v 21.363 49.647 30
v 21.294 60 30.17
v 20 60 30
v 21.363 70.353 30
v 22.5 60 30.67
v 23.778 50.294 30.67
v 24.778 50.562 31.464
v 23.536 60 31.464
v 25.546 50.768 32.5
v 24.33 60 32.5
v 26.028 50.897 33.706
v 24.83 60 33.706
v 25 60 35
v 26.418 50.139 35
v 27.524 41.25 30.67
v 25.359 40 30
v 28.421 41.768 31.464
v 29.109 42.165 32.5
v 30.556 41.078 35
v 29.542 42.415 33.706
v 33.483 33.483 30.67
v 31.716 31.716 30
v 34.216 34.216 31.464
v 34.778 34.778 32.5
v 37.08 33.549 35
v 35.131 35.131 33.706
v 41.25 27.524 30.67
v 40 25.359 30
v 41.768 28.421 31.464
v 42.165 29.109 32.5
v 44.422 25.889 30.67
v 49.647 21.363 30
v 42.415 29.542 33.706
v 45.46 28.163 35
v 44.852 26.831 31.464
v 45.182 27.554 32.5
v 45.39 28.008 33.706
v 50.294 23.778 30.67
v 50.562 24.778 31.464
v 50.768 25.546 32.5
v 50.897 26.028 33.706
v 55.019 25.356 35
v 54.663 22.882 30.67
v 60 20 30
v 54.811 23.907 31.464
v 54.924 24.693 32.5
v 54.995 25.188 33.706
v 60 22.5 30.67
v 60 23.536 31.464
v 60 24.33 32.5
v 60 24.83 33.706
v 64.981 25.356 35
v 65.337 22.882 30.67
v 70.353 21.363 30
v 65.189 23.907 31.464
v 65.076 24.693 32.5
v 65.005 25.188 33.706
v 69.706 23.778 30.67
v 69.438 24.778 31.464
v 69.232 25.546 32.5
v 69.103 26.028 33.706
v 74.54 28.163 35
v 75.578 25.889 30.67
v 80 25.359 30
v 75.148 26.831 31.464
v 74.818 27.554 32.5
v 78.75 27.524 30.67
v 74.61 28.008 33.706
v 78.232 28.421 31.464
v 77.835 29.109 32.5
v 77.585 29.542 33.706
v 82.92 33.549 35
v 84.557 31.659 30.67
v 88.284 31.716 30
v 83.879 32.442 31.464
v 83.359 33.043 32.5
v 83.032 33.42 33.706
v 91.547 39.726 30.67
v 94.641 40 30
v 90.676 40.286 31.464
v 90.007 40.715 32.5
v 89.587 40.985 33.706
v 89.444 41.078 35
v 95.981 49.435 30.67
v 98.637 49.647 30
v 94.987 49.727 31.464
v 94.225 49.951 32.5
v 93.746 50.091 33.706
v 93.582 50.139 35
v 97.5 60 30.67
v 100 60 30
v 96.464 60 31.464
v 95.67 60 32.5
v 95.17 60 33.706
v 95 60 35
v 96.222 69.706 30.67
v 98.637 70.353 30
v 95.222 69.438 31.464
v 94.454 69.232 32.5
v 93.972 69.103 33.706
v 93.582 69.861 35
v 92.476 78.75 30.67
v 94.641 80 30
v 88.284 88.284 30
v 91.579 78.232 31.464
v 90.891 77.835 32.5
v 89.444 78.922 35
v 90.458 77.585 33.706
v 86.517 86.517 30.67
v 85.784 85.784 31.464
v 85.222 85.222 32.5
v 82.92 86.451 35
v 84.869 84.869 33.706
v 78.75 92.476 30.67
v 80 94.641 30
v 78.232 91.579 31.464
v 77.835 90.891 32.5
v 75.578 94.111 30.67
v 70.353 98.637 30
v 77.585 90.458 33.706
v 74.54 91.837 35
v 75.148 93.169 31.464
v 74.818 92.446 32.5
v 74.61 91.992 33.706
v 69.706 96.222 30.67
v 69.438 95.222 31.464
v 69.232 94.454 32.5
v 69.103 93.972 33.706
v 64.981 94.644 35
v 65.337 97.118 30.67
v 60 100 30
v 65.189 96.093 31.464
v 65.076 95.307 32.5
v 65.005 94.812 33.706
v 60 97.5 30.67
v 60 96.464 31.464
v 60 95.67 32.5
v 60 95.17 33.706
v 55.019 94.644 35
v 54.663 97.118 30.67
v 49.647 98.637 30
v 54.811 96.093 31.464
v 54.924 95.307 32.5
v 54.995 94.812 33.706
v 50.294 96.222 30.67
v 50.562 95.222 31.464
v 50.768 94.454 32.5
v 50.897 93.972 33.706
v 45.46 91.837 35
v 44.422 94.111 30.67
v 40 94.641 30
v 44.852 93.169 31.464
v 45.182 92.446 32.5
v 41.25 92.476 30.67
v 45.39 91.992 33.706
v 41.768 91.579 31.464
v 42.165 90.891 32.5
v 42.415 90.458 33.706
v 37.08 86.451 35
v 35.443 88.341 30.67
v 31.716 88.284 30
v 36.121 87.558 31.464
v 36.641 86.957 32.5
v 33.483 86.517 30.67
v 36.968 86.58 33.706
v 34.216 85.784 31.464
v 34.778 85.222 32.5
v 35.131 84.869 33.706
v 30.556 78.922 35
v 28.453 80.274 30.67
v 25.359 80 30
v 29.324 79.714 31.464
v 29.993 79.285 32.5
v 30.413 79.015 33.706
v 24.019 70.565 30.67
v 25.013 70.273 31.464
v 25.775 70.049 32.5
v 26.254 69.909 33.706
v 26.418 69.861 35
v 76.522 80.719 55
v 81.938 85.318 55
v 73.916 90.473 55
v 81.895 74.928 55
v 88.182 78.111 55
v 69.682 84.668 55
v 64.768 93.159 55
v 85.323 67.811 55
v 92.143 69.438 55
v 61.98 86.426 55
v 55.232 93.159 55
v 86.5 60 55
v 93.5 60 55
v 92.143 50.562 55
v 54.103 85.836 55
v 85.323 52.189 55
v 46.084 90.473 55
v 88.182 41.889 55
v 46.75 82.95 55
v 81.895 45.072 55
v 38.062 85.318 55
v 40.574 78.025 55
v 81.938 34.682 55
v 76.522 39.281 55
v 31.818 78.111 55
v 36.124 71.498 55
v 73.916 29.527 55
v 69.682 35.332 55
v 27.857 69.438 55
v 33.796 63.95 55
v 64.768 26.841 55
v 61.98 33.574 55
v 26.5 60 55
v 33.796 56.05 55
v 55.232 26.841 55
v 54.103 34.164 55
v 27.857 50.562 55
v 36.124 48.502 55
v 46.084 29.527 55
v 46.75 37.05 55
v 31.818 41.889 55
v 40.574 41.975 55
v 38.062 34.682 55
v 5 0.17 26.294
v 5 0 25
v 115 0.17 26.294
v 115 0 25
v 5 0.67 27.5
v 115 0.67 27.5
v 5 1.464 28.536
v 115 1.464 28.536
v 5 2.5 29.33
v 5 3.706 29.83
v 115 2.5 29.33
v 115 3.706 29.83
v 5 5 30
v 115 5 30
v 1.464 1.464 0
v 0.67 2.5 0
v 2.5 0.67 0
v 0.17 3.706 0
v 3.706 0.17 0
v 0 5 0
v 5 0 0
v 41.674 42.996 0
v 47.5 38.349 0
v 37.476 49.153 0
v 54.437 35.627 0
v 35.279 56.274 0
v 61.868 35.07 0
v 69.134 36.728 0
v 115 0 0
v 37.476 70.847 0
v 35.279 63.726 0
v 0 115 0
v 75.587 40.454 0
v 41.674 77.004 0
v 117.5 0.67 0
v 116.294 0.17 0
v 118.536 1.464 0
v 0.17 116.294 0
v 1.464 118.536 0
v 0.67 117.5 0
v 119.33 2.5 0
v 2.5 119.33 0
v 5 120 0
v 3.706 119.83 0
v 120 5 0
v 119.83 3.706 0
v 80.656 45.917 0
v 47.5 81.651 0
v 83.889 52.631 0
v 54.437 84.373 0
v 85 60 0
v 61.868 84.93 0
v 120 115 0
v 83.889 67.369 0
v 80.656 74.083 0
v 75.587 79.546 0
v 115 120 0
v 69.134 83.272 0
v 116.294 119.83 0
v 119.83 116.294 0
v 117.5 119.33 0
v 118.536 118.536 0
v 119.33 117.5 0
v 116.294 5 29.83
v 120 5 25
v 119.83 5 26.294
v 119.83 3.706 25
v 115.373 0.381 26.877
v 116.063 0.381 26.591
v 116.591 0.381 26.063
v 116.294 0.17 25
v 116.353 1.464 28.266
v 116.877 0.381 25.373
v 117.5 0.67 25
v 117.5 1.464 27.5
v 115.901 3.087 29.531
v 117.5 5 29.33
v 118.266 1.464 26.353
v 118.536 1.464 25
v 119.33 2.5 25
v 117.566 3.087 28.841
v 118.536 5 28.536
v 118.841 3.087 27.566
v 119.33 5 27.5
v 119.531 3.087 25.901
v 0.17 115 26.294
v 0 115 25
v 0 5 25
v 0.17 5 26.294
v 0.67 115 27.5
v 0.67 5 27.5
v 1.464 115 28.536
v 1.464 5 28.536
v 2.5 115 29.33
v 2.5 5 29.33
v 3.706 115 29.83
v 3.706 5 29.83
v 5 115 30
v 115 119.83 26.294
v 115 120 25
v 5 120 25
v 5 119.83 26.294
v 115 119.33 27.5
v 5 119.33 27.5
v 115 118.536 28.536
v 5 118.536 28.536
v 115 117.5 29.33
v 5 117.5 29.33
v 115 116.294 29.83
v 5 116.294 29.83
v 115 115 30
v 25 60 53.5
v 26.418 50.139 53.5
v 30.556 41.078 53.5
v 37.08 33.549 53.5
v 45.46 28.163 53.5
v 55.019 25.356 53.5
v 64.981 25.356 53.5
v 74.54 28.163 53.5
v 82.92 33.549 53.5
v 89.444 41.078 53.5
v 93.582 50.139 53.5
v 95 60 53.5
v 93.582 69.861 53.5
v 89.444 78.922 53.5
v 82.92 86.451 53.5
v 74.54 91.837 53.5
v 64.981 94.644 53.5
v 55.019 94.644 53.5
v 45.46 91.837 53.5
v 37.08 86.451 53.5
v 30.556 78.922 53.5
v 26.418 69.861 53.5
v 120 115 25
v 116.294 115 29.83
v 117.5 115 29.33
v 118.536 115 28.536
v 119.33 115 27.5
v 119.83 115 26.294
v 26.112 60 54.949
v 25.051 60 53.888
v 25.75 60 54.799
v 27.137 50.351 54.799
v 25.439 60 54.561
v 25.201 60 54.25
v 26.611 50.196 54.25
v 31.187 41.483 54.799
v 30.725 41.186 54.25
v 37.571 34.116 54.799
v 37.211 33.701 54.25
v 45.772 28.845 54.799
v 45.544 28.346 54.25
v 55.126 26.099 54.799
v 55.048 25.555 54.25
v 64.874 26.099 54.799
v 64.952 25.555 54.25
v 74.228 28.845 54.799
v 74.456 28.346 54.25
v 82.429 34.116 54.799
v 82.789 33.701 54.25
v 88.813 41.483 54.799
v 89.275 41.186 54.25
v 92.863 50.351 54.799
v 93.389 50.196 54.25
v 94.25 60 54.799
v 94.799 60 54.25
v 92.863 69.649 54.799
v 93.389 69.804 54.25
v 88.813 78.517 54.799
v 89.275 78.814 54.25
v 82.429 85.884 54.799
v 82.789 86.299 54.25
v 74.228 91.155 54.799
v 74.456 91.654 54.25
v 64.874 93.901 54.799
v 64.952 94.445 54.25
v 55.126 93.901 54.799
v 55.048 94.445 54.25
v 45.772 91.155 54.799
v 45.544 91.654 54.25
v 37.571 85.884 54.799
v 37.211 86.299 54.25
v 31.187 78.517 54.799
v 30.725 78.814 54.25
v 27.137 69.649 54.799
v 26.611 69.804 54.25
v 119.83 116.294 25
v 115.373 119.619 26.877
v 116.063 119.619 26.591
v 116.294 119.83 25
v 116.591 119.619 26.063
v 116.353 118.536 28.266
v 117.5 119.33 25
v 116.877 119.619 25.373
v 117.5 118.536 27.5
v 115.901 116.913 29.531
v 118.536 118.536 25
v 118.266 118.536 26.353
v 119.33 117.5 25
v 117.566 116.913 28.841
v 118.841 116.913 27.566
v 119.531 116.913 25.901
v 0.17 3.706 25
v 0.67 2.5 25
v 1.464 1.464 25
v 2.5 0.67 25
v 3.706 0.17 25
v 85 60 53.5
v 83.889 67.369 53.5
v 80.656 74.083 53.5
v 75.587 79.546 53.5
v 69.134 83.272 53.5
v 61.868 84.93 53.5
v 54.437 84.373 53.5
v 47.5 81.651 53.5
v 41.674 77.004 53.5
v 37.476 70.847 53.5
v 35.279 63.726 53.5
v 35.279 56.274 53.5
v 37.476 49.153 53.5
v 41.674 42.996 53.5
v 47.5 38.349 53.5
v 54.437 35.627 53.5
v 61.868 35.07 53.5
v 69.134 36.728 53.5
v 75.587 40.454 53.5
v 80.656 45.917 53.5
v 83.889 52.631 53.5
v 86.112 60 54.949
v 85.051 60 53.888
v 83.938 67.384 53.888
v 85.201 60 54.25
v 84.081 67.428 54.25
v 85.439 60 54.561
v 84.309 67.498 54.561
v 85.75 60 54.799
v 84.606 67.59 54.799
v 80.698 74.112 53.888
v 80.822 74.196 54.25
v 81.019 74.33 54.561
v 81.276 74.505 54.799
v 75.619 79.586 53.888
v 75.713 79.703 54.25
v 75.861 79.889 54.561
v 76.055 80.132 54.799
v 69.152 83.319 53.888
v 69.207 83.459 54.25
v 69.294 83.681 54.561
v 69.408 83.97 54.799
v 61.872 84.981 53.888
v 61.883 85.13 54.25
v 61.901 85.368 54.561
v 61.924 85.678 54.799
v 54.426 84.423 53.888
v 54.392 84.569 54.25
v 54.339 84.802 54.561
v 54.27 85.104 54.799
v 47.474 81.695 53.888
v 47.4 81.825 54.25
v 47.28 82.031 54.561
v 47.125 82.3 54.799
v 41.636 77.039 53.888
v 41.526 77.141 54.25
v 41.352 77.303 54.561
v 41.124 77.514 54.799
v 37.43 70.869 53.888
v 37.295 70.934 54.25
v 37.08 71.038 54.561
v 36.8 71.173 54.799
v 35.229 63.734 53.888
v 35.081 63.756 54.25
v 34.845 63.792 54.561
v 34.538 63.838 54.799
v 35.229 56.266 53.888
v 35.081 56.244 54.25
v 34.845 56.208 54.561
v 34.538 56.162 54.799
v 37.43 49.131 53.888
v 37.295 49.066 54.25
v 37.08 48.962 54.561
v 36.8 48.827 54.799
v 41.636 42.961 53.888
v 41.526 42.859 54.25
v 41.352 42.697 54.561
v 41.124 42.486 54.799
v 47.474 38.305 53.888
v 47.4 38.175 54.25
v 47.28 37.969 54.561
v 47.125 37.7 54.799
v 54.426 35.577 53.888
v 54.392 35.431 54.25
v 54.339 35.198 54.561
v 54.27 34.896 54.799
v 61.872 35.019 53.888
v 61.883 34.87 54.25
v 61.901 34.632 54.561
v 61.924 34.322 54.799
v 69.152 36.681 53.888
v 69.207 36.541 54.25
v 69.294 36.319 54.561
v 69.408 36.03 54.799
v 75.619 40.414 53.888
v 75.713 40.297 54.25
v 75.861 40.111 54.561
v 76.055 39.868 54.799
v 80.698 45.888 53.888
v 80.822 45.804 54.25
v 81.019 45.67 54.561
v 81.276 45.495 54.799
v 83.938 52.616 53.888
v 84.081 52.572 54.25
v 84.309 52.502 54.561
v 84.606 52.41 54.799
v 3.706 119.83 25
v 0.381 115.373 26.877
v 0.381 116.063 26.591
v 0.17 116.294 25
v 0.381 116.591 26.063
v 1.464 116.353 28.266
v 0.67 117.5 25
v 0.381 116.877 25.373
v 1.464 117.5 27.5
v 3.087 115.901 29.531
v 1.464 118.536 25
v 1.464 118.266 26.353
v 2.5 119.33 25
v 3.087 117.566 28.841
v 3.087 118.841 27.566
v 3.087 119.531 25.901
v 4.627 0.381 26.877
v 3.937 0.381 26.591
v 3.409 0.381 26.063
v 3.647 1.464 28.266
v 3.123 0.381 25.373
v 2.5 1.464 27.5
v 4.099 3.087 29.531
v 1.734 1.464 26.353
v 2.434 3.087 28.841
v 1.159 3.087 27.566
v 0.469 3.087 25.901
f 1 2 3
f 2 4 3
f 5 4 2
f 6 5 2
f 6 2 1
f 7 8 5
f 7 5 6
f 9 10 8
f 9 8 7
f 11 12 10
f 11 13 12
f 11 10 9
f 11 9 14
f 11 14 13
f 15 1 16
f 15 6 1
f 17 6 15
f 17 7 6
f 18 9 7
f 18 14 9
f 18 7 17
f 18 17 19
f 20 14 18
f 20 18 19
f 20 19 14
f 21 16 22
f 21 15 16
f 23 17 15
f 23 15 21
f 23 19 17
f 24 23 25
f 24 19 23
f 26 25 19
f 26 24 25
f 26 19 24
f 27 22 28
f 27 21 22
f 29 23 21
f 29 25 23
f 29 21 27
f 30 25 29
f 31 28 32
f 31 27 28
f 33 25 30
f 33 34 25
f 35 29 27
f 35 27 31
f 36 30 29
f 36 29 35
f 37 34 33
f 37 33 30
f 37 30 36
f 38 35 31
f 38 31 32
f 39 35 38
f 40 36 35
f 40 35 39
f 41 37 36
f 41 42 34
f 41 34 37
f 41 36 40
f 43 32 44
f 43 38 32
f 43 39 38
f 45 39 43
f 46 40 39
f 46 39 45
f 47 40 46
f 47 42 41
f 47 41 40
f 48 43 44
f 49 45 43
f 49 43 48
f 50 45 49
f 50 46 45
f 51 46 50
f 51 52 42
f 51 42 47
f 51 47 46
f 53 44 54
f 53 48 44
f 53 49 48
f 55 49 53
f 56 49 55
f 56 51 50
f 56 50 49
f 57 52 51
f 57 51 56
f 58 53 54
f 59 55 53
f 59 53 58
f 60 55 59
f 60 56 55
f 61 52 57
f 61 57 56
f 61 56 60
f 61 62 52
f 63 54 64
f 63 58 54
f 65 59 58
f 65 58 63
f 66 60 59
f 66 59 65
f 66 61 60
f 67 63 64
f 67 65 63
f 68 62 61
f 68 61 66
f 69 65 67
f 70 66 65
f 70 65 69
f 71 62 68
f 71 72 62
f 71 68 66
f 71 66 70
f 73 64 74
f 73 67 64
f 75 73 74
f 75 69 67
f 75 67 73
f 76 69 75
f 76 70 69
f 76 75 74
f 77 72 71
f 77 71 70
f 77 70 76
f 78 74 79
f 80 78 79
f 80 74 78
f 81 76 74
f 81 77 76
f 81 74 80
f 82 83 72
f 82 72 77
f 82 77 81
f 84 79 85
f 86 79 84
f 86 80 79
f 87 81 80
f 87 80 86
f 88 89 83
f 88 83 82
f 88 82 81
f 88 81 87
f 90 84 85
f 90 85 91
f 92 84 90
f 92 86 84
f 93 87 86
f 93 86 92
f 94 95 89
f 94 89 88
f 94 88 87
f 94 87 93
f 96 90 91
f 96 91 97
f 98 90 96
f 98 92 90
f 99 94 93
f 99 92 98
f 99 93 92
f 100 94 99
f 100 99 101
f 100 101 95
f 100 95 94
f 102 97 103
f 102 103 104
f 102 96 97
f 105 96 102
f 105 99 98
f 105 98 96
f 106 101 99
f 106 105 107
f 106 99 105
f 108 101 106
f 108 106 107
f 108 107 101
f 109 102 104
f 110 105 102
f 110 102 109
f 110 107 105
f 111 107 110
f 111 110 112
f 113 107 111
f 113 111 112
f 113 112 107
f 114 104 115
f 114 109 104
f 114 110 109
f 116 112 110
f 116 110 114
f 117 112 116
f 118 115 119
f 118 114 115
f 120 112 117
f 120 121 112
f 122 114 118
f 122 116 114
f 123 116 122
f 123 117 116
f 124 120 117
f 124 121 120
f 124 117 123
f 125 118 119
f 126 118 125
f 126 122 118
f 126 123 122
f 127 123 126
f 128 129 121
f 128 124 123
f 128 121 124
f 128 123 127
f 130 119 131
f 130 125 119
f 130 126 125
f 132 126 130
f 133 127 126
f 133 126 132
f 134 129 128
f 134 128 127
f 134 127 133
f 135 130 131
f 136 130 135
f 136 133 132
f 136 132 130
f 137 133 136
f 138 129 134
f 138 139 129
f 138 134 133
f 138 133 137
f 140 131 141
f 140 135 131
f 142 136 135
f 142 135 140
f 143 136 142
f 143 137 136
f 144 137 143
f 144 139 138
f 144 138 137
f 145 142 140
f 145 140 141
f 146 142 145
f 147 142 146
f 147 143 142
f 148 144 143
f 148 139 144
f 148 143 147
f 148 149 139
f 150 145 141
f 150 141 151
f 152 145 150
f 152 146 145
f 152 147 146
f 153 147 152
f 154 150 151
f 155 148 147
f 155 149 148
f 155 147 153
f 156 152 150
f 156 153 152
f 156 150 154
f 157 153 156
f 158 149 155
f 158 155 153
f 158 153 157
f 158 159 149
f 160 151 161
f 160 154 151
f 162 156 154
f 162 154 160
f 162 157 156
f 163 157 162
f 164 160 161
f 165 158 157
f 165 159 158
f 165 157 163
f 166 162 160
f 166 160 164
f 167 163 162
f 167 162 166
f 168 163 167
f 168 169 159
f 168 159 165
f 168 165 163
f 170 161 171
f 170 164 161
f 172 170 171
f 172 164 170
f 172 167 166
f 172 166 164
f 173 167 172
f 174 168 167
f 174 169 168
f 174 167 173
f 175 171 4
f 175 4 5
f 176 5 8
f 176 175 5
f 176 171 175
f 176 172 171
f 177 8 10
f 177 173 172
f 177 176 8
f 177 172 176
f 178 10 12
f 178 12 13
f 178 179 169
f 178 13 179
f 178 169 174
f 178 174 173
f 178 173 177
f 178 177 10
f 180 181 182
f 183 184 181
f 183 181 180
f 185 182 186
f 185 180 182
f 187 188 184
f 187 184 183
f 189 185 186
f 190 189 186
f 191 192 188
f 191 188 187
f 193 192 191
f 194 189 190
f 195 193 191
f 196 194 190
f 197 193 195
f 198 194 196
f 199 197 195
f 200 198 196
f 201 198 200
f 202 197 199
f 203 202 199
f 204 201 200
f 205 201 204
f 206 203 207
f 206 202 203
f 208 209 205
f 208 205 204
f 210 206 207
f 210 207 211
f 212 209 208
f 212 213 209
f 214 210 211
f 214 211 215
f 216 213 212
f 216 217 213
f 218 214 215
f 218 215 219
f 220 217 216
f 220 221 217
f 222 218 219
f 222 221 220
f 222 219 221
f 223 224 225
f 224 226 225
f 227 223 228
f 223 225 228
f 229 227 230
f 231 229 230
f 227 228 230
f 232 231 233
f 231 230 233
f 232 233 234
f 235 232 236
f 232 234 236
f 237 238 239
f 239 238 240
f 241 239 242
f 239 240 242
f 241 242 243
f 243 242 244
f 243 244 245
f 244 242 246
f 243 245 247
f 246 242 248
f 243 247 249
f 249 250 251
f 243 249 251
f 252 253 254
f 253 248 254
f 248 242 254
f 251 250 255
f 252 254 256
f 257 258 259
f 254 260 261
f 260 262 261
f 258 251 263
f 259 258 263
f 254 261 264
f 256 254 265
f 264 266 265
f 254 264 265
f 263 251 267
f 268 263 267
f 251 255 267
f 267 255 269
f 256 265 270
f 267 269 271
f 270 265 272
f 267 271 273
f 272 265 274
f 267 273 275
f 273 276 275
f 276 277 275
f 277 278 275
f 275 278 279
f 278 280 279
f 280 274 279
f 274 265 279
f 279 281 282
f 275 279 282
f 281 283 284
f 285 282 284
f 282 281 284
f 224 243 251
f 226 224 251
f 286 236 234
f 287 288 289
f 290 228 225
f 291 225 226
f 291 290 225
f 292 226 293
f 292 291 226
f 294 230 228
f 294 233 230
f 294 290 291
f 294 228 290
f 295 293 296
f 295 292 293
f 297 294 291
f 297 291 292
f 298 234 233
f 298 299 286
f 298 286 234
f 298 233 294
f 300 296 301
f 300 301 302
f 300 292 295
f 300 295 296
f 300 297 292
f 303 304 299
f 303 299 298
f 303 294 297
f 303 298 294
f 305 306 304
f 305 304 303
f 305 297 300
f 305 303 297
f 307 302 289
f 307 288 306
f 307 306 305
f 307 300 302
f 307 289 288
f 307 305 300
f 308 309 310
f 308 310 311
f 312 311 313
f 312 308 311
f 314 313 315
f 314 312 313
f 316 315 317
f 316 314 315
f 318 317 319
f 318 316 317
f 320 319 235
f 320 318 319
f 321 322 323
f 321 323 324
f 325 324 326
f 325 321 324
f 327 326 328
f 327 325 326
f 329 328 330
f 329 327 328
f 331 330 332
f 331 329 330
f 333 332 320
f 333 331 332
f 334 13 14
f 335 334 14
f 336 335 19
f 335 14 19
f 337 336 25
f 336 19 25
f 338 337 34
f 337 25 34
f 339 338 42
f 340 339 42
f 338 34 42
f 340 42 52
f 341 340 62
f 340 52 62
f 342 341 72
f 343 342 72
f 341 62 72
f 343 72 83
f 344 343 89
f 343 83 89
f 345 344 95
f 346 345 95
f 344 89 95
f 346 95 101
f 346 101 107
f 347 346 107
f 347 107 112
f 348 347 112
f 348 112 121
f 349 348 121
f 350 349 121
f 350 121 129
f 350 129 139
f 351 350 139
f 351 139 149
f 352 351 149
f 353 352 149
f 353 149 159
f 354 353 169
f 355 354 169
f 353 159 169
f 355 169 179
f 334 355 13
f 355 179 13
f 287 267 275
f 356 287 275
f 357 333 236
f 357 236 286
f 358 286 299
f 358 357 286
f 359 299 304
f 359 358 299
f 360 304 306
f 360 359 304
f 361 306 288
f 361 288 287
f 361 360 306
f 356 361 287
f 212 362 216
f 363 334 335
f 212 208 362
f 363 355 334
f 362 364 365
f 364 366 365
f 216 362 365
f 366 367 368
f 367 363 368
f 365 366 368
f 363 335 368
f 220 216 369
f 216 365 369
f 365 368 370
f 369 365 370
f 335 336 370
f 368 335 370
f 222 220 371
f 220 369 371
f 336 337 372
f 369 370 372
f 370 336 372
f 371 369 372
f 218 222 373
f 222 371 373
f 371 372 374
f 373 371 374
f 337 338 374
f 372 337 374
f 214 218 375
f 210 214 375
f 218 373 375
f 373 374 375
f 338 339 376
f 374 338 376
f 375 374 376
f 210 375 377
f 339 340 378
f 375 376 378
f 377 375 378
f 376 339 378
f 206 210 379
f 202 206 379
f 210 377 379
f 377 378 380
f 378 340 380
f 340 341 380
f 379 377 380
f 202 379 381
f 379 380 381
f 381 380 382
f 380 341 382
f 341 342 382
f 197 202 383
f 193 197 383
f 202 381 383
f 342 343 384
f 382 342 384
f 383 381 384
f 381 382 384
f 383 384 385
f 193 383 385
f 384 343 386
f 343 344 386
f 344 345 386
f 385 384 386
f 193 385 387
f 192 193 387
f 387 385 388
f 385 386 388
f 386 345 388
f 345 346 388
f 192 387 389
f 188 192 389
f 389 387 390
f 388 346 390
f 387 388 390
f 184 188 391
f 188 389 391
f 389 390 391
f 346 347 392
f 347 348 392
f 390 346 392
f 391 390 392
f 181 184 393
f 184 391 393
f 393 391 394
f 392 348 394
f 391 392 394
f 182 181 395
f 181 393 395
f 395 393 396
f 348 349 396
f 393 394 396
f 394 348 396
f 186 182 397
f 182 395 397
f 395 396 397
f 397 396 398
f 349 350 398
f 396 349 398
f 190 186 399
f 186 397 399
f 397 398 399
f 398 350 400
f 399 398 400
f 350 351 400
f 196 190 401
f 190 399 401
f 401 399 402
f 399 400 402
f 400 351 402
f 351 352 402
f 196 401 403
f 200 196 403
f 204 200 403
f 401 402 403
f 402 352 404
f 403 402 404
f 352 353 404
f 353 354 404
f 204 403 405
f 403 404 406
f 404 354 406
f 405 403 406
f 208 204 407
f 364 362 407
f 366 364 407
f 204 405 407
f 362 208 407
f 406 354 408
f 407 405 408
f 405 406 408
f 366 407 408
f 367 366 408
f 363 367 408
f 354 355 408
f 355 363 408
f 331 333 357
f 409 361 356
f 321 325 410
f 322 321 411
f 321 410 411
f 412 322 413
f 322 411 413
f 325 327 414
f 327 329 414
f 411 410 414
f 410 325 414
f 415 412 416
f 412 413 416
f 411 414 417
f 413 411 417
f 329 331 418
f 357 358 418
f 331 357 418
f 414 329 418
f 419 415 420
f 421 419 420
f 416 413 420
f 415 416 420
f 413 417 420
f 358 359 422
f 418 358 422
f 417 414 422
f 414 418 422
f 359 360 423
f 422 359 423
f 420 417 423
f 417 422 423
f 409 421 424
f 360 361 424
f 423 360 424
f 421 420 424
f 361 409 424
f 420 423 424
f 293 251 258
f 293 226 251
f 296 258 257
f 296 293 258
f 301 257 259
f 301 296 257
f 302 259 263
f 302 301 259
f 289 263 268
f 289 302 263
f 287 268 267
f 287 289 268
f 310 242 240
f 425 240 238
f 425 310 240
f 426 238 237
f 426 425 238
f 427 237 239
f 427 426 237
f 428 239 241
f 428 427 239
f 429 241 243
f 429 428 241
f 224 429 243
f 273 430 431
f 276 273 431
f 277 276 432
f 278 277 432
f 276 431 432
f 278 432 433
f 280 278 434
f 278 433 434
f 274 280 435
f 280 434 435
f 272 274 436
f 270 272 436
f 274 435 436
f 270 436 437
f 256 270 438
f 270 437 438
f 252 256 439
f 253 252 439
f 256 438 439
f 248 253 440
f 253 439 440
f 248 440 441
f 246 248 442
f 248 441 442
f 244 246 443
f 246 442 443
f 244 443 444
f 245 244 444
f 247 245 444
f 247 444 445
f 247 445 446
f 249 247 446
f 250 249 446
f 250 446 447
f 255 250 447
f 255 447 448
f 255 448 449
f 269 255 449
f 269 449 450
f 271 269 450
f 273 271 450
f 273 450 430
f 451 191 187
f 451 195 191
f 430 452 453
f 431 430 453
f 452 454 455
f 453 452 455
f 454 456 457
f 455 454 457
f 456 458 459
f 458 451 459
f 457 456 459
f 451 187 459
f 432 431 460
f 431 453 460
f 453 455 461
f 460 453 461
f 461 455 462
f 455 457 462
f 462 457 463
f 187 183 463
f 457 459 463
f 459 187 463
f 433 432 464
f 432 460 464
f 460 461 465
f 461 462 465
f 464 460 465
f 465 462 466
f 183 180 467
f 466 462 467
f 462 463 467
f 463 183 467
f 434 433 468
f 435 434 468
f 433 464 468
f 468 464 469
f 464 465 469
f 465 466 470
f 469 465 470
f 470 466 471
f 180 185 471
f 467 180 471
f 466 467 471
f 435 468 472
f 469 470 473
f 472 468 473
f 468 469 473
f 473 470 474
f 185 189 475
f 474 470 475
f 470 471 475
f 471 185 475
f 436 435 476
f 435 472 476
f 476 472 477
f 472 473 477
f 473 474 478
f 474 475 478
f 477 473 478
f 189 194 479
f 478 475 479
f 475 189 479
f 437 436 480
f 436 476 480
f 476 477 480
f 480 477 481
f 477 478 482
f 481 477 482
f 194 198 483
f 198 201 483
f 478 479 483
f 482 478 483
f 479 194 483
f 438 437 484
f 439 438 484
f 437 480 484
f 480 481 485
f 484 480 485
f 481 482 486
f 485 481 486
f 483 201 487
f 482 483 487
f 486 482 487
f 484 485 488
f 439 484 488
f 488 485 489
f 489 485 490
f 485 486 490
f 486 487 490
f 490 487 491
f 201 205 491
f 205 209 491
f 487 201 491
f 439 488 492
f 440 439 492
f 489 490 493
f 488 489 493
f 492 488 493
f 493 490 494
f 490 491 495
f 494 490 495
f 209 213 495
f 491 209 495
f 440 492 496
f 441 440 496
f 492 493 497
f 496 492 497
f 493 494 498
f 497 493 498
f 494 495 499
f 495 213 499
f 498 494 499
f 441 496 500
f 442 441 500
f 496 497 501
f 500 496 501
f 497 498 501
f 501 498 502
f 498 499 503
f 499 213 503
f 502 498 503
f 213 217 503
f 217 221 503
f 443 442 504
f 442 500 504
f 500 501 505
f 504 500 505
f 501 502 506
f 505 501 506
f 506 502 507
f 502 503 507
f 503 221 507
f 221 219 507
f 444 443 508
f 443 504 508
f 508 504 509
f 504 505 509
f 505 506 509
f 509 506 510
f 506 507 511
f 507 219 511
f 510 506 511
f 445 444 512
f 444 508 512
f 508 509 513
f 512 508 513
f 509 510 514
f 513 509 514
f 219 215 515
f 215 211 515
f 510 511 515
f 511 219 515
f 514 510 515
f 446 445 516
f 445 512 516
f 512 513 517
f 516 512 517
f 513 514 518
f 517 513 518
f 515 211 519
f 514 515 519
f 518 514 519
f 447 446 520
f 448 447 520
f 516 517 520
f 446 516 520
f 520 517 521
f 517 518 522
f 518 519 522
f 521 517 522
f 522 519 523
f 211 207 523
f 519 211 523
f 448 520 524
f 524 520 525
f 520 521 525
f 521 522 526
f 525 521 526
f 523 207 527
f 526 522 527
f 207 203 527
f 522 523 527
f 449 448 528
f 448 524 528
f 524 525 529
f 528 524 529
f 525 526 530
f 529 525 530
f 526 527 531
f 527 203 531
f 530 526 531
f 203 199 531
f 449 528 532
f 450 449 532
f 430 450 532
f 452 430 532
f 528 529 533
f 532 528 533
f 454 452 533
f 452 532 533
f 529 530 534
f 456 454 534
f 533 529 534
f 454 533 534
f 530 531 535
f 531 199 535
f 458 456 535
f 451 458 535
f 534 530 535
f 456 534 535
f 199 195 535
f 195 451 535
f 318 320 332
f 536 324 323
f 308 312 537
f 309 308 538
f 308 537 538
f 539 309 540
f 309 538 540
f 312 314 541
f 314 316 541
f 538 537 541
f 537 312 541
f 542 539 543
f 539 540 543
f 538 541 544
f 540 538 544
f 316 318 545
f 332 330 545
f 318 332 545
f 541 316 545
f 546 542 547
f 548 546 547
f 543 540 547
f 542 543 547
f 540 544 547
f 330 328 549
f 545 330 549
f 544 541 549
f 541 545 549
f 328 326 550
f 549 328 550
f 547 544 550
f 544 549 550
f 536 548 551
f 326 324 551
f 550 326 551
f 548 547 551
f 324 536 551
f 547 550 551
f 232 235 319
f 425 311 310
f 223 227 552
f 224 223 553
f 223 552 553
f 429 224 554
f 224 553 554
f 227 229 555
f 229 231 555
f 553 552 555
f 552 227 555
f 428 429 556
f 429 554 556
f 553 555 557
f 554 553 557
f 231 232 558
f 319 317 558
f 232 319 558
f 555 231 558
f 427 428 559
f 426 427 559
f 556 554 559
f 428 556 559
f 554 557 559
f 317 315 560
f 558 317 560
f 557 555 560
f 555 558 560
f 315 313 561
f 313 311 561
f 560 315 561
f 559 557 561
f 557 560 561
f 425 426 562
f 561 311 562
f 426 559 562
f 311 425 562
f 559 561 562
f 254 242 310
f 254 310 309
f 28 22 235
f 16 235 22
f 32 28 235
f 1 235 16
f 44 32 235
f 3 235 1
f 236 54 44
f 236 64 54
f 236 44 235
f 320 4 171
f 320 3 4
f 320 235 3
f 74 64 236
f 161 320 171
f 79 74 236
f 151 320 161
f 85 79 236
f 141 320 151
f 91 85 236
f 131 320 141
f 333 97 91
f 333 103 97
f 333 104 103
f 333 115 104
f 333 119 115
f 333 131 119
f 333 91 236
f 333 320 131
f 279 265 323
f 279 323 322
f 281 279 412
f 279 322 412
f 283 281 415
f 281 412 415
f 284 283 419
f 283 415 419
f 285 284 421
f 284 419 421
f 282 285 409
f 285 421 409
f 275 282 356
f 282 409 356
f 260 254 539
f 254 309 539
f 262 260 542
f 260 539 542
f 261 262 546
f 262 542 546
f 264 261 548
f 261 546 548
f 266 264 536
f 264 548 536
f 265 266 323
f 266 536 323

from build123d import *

# Parameters (mm, degrees)
SKETCH2_W           = 120
SKETCH2_H           = 120
BOSS_EXTRUDE1_DEPTH = 30
SKETCH4_R           = 35
BOSS_EXTRUDE2_DEPTH = 25
SKETCH6_R           = 25
CUT_EXTRUDE1_DEPTH  = 179.395627749
FILLET1_R           = 5
FILLET2_R           = 1.5


with BuildPart() as part:
    # Sketch2 → Boss-Extrude1 (new body)
    with BuildSketch(Plane.XY):
        with Locations((60, 60)):
            Rectangle(SKETCH2_W, SKETCH2_H)
    extrude(amount=BOSS_EXTRUDE1_DEPTH)

    # Sketch4 → Boss-Extrude2 (add)
    with BuildSketch(Plane.XY.offset(30)):
        with Locations(Location((60, 60, 0), (0, 0, 180))):
            Circle(SKETCH4_R)
    extrude(amount=BOSS_EXTRUDE2_DEPTH)

    # Sketch6 → Cut-Extrude1 (cut, through all)
    with BuildSketch(Plane.XY.offset(55)):
        with Locations((60, 60)):
            Circle(SKETCH6_R)
    extrude(amount=-CUT_EXTRUDE1_DEPTH, mode=Mode.SUBTRACT)

    # Fillet1
    fillet1_edges = [part.edges().sort_by_distance(p)[0] for p in [
        (120, 60, 30),
        (60, 120, 30),
        (95, 60, 30),
        (0, 60, 30),
        (60, 0, 30),
        (0, 120, 15),
        (120, 120, 15),
        (120, 0, 15),
        (0, 0, 15),
    ]]
    fillet(fillet1_edges, radius=FILLET1_R)

    # Fillet2
    fillet2_edges = [part.edges().sort_by_distance(p)[0] for p in [
        (95, 60, 55),
        (35, 60, 55),
    ]]
    fillet(fillet2_edges, radius=FILLET2_R)


solid = part.part
